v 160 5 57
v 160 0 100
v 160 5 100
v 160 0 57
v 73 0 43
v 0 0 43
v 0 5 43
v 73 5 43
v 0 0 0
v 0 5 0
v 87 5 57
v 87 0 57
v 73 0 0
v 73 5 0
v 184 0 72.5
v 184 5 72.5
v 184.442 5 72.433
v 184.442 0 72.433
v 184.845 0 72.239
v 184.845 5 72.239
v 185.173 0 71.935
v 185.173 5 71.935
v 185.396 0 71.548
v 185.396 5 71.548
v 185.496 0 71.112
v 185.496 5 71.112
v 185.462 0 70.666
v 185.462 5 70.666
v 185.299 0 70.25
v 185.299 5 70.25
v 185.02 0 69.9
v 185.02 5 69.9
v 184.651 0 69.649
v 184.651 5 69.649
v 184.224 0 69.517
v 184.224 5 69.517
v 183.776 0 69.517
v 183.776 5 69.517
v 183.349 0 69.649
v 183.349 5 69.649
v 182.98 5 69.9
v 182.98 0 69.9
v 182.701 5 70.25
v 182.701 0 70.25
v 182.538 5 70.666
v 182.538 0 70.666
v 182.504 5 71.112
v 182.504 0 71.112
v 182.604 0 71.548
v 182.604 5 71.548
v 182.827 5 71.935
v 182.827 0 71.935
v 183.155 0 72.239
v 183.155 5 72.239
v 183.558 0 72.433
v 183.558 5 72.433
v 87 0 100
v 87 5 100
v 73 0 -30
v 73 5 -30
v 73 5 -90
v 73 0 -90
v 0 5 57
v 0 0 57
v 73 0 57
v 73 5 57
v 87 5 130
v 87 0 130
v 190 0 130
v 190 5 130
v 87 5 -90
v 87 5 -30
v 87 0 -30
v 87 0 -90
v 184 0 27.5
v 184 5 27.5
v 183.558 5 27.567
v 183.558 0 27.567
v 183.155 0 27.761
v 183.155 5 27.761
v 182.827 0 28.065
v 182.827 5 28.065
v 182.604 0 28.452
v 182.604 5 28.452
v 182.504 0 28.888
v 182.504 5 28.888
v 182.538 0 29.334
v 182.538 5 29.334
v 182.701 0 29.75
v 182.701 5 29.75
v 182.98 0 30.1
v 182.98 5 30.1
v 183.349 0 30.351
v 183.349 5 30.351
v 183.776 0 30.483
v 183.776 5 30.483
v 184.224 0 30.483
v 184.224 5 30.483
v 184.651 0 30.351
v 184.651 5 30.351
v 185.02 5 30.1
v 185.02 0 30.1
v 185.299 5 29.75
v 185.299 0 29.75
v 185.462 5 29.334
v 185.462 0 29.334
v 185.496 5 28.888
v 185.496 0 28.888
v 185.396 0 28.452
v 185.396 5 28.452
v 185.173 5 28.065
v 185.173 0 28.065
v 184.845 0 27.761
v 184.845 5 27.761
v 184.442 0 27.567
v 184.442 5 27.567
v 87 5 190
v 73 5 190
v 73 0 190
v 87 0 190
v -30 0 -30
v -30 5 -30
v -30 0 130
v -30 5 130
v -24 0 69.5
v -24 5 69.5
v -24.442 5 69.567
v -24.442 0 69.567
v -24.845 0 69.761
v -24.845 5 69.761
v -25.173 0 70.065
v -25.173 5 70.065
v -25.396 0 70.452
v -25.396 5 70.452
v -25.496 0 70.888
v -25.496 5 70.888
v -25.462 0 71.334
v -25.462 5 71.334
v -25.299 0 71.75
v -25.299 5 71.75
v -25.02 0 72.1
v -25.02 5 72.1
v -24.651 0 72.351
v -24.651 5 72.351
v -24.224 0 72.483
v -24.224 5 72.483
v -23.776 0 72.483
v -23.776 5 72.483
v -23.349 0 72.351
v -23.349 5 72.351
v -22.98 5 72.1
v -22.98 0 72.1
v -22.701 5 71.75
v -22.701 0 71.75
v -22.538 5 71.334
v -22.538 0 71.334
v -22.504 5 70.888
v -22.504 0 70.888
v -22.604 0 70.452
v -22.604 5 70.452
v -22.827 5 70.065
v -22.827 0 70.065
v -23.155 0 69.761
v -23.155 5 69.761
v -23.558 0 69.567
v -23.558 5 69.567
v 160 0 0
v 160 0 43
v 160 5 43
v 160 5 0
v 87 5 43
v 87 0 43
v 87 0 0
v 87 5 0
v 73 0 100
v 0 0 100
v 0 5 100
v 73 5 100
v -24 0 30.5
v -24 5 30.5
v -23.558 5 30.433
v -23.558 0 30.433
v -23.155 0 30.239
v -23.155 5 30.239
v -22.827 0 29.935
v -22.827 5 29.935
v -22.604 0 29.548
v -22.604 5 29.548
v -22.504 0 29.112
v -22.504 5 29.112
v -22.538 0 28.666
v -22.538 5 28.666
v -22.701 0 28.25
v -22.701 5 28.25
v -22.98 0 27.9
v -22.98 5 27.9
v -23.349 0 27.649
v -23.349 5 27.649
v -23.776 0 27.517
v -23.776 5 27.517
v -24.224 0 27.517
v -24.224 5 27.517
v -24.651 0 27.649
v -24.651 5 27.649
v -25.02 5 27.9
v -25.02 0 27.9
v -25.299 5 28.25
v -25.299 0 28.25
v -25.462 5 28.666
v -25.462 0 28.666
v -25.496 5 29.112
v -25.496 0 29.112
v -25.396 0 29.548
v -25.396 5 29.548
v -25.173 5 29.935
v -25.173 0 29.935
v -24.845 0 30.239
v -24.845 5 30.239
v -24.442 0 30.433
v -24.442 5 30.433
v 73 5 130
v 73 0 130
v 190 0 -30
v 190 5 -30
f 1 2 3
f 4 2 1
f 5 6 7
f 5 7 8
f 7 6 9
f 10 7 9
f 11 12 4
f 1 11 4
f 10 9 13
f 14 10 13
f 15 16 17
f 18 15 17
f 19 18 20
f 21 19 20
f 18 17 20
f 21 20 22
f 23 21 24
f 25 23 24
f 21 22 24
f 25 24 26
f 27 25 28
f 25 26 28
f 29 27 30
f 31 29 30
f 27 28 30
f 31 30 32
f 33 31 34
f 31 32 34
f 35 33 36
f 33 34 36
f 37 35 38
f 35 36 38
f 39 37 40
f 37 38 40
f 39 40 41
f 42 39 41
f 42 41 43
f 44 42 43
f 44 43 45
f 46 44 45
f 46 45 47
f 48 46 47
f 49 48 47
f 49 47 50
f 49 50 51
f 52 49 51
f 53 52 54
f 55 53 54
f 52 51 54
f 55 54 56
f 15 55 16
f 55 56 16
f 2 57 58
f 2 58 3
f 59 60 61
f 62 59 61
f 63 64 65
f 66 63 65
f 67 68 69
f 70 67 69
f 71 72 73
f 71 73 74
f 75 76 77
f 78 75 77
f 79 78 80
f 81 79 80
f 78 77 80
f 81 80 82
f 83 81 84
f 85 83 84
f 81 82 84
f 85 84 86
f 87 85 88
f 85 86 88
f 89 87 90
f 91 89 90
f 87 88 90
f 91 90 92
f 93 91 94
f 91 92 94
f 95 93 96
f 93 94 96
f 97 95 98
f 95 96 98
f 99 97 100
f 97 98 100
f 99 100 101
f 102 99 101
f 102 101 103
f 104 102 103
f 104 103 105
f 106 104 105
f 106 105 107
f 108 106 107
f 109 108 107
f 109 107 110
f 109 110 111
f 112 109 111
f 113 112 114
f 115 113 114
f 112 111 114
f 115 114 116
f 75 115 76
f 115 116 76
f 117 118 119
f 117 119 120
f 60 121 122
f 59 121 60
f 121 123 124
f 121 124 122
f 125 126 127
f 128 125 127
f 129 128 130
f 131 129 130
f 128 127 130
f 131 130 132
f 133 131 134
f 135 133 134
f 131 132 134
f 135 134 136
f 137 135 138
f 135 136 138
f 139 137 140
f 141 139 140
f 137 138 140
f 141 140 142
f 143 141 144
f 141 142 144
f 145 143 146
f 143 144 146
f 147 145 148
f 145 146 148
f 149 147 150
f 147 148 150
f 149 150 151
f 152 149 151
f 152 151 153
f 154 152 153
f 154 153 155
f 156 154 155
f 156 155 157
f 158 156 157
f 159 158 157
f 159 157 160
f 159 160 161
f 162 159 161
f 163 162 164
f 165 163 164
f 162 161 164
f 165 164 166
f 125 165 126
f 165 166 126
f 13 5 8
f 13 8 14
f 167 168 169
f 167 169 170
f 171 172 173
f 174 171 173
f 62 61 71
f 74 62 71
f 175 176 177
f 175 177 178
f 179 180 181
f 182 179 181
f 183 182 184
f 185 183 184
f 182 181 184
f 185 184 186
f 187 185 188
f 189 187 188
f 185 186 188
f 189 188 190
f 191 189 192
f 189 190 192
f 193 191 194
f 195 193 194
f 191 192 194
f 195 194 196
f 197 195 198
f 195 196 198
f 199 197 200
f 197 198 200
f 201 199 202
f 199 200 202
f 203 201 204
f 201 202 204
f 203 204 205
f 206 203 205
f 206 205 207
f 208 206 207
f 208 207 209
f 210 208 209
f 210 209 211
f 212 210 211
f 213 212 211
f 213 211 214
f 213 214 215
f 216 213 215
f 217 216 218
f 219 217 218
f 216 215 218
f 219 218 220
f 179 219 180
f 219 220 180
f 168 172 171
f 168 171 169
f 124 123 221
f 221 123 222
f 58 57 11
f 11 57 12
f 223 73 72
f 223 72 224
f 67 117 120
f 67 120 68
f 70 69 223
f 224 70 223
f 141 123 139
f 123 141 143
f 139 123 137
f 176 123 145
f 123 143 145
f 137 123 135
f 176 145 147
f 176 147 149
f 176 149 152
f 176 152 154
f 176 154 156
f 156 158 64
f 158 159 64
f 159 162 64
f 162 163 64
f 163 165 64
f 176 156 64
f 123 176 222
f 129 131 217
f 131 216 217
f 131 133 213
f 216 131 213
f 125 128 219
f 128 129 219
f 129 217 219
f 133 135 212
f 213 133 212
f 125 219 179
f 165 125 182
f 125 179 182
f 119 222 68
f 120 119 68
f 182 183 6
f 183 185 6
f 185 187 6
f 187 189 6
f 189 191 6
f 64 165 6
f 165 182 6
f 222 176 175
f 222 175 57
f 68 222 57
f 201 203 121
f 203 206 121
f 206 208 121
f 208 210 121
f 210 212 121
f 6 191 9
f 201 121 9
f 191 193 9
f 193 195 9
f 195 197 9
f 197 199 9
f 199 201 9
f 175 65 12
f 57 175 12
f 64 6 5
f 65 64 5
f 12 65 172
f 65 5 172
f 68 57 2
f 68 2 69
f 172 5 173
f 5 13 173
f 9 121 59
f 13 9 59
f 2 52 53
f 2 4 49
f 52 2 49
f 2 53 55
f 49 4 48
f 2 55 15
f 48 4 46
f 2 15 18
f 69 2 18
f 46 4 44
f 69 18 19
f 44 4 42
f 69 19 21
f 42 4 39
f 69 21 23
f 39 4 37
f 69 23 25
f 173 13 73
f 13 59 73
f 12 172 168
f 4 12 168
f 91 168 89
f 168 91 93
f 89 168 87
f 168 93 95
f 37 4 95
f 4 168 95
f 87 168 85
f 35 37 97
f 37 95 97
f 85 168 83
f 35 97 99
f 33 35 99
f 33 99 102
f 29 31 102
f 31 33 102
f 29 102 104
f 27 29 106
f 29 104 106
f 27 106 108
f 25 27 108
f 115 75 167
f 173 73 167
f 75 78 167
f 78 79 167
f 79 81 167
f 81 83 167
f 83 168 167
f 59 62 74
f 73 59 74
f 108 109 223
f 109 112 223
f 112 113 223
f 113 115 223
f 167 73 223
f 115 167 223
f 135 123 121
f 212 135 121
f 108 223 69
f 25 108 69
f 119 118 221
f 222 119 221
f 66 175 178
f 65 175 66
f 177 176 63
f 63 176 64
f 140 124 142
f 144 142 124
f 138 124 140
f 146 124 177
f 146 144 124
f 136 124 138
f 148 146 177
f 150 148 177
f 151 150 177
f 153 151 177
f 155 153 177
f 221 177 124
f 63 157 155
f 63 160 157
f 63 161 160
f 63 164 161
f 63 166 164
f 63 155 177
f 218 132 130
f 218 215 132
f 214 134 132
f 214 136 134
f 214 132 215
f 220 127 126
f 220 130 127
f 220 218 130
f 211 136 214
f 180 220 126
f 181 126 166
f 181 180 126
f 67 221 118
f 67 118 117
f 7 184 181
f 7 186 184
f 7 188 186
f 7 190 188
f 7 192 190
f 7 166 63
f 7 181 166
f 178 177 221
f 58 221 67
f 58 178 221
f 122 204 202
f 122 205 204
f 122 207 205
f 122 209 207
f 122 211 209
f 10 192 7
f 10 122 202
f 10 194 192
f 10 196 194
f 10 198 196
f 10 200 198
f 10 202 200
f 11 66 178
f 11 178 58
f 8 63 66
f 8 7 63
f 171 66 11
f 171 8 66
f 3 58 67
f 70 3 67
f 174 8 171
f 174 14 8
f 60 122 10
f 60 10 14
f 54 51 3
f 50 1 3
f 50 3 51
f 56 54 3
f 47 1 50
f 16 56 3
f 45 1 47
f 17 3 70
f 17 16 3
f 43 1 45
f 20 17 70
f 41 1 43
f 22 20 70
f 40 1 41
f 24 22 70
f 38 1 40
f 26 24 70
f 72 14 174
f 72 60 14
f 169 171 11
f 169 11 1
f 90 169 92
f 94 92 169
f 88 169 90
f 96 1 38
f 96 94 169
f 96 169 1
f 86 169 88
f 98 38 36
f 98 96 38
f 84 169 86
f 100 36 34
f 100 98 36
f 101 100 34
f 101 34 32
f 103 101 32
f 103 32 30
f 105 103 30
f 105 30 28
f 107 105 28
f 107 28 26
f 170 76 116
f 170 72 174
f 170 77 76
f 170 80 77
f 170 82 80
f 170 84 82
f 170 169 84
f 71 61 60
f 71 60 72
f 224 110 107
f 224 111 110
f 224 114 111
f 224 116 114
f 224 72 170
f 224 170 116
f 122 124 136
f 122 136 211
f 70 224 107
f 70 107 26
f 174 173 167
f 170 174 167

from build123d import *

# Parameters (mm, degrees)
SKETCH1_W           = 220
SKETCH1_H           = 160
SKETCH1_W_2         = 160
SKETCH1_H_2         = 100
SKETCH1_W_3         = 73
SKETCH1_H_3         = 14
SKETCH1_W_4         = 14
SKETCH1_H_4         = 43
BOSS_EXTRUDE1_DEPTH = 5
SKETCH2_R           = 1.5
CUT_EXTRUDE1_DEPTH  = 5
SKETCH3_W           = 14
SKETCH3_H           = 60
BOSS_EXTRUDE2_DEPTH = 5


with BuildPart() as part:
    # Sketch1 → Boss-Extrude1 (new body)
    # profile 1 of 6: a face of its own
    with BuildSketch(Plane(origin=(0, 0, 0), x_dir=(1, 0, 0), z_dir=(0, 1, 0))):
        with Locations((80, -50)):
            Rectangle(SKETCH1_W, SKETCH1_H)
        with Locations((80, -50)):
            Rectangle(SKETCH1_W_2, SKETCH1_H_2, mode=Mode.SUBTRACT)
    # profile 2 of 6: a face of its own
    with BuildSketch(Plane(origin=(0, 0, 0), x_dir=(1, 0, 0), z_dir=(0, 1, 0))):
        with Locations((36.5, -50)):
            Rectangle(SKETCH1_W_3, SKETCH1_H_3)
    # profile 3 of 6: a face of its own
    with BuildSketch(Plane(origin=(0, 0, 0), x_dir=(1, 0, 0), z_dir=(0, 1, 0))):
        with Locations((123.5, -50)):
            Rectangle(SKETCH1_W_3, SKETCH1_H_3)
    # profile 4 of 6: a face of its own
    with BuildSketch(Plane(origin=(0, 0, 0), x_dir=(1, 0, 0), z_dir=(0, 1, 0))):
        with Locations((80, -21.5)):
            Rectangle(SKETCH1_W_4, SKETCH1_H_4)
    # profile 5 of 6: a face of its own
    with BuildSketch(Plane(origin=(0, 0, 0), x_dir=(1, 0, 0), z_dir=(0, 1, 0))):
        with Locations((80, -78.5)):
            Rectangle(SKETCH1_W_4, SKETCH1_H_4)
    # profile 6 of 6: a face of its own
    with BuildSketch(Plane(origin=(0, 0, 0), x_dir=(1, 0, 0), z_dir=(0, 1, 0))):
        with Locations((80, -50)):
            Rectangle(SKETCH1_W_4, SKETCH1_H_3)
    extrude(amount=BOSS_EXTRUDE1_DEPTH)

    # Sketch2 → Cut-Extrude1 (cut)
    with BuildSketch(Plane(origin=(0, 5, 0), x_dir=(1, 0, 0), z_dir=(0, 1, 0))):
        with Locations(Location((-24, -29, 0), (0, 0, 270))):
            Circle(SKETCH2_R)
        with Locations(Location((-24, -71, 0), (0, 0, 90))):
            Circle(SKETCH2_R)
        with Locations(Location((184, -29, 0), (0, 0, 90))):
            Circle(SKETCH2_R)
        with Locations(Location((184, -71, 0), (0, 0, 270))):
            Circle(SKETCH2_R)
    extrude(amount=-CUT_EXTRUDE1_DEPTH, mode=Mode.SUBTRACT)

    # Sketch3 → Boss-Extrude2 (add)
    with BuildSketch(Plane(origin=(0, 5, 0), x_dir=(1, 0, 0), z_dir=(0, 1, 0))):
        with Locations((80, 60)):
            Rectangle(SKETCH3_W, SKETCH3_H)
        with Locations((80, -160)):
            Rectangle(SKETCH3_W, SKETCH3_H)
    extrude(amount=-BOSS_EXTRUDE2_DEPTH)


solid = part.part
